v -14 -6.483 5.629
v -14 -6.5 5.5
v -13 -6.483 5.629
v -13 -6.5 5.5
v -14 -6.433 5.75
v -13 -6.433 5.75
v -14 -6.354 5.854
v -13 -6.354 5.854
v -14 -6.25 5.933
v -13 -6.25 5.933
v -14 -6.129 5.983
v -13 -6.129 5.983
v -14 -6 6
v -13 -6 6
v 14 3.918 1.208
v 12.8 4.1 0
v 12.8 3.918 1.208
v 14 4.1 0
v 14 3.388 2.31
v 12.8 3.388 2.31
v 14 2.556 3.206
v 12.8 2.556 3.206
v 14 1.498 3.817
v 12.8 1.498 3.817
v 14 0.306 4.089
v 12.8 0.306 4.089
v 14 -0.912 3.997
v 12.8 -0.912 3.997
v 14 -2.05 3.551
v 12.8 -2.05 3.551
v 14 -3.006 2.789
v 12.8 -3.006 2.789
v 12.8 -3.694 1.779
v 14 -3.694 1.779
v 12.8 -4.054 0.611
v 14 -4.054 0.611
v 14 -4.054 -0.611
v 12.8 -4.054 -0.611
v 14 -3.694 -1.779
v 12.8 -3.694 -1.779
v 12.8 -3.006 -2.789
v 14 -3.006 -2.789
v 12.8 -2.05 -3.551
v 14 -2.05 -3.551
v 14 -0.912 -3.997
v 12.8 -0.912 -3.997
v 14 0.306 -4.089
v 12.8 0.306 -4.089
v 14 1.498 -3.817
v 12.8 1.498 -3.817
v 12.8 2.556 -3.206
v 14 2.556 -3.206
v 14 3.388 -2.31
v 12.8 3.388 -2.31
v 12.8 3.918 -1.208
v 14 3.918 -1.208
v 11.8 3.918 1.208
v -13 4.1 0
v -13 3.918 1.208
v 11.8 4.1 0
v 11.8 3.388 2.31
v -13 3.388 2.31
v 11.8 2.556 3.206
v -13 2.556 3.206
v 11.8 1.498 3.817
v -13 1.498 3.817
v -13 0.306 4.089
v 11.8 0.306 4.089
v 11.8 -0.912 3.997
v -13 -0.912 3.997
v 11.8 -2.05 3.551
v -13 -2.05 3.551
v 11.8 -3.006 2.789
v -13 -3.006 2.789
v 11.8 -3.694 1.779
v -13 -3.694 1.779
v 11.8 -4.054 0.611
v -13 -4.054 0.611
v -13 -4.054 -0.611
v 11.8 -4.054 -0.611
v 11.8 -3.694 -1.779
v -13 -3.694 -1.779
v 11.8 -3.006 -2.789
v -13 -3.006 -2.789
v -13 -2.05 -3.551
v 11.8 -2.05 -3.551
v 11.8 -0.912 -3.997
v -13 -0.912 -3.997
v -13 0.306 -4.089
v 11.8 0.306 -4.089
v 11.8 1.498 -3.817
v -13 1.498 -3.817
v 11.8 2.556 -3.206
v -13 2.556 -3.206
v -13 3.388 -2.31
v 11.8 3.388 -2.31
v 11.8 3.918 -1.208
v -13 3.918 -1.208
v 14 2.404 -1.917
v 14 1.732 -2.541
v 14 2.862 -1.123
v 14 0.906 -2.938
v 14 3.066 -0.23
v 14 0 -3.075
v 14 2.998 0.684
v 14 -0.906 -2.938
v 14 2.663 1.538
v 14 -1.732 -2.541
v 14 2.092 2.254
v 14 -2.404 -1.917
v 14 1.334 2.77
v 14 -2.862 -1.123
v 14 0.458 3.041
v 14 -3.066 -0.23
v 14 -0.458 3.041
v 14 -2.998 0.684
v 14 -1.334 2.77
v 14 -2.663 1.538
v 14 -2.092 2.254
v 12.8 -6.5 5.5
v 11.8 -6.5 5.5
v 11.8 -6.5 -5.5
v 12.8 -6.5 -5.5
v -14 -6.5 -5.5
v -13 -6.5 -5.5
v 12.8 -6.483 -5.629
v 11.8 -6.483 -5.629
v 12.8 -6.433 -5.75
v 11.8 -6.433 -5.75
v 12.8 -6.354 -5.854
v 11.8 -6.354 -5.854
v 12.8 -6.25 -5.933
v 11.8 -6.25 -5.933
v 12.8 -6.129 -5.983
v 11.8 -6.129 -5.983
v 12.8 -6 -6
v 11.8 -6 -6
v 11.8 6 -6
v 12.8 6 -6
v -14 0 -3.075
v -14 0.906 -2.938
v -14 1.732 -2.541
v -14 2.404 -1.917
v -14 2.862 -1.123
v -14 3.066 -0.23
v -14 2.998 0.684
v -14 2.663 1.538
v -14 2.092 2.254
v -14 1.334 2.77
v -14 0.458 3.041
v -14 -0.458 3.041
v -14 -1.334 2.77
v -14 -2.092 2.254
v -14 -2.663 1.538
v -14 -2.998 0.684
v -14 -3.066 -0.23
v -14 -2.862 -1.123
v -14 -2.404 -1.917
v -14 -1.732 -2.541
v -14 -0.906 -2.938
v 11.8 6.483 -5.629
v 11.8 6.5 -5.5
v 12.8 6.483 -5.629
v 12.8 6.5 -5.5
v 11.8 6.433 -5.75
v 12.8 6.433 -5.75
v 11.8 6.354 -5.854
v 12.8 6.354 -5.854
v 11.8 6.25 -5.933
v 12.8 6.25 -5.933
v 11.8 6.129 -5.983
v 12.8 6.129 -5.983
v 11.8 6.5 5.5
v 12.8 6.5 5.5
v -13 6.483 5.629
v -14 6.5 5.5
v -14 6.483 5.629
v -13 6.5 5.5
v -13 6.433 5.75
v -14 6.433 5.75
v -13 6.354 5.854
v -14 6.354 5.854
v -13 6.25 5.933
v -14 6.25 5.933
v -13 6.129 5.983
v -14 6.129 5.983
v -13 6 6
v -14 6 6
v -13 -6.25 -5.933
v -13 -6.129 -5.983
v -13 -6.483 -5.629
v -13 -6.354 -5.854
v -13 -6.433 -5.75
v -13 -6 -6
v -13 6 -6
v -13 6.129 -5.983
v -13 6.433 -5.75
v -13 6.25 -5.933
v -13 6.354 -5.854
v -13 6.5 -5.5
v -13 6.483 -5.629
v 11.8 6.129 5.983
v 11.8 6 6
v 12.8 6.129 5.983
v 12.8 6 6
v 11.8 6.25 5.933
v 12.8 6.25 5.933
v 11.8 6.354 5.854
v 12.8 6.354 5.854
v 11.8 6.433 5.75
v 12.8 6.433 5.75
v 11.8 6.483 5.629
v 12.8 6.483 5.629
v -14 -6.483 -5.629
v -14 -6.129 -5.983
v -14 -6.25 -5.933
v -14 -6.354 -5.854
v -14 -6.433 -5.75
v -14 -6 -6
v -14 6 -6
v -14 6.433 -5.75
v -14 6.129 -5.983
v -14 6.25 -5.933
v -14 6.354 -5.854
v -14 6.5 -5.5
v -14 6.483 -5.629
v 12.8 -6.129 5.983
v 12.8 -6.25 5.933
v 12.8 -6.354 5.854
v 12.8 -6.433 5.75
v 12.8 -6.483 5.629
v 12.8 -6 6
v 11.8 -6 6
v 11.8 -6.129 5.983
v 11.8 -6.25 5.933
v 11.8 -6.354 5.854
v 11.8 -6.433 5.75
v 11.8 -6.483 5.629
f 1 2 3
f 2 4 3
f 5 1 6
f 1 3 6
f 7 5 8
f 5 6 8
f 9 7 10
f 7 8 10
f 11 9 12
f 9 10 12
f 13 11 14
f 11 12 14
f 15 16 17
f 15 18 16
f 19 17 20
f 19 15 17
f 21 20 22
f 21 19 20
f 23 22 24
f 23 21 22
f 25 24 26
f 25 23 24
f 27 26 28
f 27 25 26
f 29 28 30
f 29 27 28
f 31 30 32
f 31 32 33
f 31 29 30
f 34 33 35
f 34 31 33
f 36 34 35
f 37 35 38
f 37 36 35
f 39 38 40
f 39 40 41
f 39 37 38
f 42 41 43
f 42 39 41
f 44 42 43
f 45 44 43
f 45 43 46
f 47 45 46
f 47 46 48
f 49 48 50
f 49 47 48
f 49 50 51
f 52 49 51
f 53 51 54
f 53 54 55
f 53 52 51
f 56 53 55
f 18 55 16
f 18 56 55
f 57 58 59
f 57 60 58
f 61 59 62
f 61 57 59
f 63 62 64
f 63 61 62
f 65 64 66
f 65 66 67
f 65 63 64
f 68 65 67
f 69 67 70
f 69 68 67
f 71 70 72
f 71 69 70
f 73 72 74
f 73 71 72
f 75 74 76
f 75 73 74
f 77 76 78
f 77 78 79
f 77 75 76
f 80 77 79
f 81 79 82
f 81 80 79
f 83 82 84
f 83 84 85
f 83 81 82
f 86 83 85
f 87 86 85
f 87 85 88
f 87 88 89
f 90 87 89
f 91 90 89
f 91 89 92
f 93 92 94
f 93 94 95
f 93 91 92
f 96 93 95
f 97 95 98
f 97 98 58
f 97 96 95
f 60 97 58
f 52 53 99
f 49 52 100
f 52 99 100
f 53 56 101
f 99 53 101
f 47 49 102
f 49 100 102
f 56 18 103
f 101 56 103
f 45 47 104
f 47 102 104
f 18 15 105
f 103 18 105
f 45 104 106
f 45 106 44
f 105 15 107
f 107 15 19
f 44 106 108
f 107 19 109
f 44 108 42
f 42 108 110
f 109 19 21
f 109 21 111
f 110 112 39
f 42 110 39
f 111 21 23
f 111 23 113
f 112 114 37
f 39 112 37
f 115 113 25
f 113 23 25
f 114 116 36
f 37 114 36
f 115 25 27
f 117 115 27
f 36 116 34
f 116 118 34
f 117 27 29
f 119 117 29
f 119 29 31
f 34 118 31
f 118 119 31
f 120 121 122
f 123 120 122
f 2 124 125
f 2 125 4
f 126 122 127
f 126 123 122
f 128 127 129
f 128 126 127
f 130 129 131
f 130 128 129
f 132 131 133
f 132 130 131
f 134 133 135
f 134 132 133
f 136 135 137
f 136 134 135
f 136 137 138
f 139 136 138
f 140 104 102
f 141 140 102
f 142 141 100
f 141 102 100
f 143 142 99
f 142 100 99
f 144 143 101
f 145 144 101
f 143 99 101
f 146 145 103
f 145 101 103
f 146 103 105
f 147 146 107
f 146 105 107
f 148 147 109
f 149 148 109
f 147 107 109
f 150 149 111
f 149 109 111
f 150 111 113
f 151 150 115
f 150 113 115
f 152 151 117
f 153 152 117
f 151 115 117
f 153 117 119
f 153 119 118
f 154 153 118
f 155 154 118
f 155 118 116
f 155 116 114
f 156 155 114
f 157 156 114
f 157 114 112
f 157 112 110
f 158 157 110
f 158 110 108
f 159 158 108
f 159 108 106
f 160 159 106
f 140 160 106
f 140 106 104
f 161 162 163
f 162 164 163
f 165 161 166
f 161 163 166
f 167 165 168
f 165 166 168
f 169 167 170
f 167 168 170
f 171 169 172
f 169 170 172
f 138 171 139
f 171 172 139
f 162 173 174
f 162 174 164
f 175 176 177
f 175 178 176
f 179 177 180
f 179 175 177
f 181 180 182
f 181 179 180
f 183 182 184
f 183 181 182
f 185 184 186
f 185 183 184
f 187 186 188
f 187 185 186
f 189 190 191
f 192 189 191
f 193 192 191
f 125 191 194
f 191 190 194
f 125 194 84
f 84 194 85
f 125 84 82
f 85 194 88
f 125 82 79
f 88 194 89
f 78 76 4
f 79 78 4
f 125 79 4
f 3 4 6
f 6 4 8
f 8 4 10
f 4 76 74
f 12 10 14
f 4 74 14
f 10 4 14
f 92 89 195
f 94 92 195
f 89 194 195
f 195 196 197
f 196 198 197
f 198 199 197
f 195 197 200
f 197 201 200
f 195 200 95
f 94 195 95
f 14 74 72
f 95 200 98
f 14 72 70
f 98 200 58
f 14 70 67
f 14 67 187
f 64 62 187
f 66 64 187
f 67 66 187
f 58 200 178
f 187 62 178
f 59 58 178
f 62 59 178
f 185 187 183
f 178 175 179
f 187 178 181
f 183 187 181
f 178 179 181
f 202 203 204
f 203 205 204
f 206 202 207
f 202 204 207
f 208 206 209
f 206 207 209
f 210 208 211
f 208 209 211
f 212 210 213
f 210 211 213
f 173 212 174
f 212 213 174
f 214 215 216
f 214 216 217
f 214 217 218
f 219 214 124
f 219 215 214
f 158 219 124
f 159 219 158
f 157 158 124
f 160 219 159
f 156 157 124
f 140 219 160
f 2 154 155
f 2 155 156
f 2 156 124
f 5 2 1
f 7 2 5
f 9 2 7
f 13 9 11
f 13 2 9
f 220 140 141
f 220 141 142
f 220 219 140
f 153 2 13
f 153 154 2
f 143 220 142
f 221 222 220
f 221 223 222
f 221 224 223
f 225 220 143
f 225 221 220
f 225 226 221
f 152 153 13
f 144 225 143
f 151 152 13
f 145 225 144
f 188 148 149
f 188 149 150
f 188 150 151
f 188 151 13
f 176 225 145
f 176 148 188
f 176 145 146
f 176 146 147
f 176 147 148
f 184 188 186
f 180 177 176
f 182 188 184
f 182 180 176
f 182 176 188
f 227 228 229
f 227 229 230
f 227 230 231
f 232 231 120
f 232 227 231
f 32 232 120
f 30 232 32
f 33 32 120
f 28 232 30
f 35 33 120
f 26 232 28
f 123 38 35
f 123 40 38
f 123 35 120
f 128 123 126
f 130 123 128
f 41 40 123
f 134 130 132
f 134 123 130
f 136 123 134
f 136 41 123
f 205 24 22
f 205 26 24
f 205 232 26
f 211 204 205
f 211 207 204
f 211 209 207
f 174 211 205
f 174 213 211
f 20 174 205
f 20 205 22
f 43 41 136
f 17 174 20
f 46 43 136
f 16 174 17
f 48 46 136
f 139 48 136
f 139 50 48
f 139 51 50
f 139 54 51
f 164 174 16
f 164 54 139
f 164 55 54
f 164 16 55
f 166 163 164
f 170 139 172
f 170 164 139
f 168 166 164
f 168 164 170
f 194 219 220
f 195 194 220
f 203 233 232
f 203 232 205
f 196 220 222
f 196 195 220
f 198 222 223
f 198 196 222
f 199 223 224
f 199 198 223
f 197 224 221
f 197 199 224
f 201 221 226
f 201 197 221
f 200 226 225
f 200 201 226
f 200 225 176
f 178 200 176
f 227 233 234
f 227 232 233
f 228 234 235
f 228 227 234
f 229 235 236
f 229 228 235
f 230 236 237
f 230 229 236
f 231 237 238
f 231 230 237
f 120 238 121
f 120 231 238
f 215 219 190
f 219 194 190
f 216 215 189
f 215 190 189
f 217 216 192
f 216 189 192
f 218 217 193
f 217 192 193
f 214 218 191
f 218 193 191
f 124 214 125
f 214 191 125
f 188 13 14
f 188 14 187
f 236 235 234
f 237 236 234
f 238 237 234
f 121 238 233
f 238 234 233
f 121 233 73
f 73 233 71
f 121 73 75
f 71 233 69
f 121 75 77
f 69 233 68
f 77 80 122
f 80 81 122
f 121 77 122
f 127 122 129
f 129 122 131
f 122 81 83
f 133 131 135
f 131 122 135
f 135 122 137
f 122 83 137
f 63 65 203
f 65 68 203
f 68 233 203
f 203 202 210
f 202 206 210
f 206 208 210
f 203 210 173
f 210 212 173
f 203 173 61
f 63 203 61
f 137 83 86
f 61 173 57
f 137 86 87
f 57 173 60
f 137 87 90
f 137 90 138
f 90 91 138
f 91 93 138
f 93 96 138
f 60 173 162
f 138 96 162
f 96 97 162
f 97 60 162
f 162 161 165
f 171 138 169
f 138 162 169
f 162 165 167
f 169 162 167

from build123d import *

# Parameters (mm, degrees)
CROQUIS1_W              = 28
CROQUIS1_H              = 4.1
CROQUIS3_W              = 12
CROQUIS3_H              = 13
SALIENTE_EXTRUIR1_DEPTH = 1
CROQUIS4_W              = 12
CROQUIS4_H              = 13
SALIENTE_EXTRUIR2_DEPTH = 1
REDONDEO1_R             = 0.5
CORTAR_EXTRUIR1_REACH   = 30
CROQUIS5_R              = 3.075


with BuildPart() as part:
    # Croquis1 → Revolución1 (revolve)
    with BuildSketch(Plane.XY):
        with Locations((0, 2.05)):
            Rectangle(CROQUIS1_W, CROQUIS1_H)
    revolve(axis=Axis((-14, 0, 0), (1, 0, 0)))

    # Croquis3 → Saliente-Extruir1 (add)
    with BuildSketch(Plane(origin=(11.8, 0, 0), x_dir=(0, 0, -1), z_dir=(1, 0, 0))):
        Rectangle(CROQUIS3_W, CROQUIS3_H)
    extrude(amount=SALIENTE_EXTRUIR1_DEPTH)

    # Croquis4 → Saliente-Extruir2 (add)
    with BuildSketch(Plane.ZY.offset(14)):
        Rectangle(CROQUIS4_W, CROQUIS4_H)
    extrude(amount=-SALIENTE_EXTRUIR2_DEPTH)

    # Redondeo1
    redondeo1_edges = [part.edges().sort_by_distance(p)[0] for p in [
        (12.3, 6.5, 6),
        (12.3, -6.5, 6),
        (12.3, -6.5, -6),
        (12.3, 6.5, -6),
        (-13.5, -6.5, -6),
        (-13.5, 6.5, -6),
        (-13.5, 6.5, 6),
        (-13.5, -6.5, 6),
    ]]
    fillet(redondeo1_edges, radius=REDONDEO1_R)

    # Croquis5 → Cortar-Extruir1 (cut, up to next)
    with BuildSketch(Plane(origin=(14, 0, 0), x_dir=(0, 0, -1), z_dir=(1, 0, 0)), mode=Mode.PRIVATE) as cortar_extruir1_sk1:
        Circle(CROQUIS5_R)
    cortar_extruir1_tool1 = extrude(cortar_extruir1_sk1.sketch, amount=-CORTAR_EXTRUIR1_REACH, mode=Mode.PRIVATE) & part.part
    add(cortar_extruir1_tool1.solids().sort_by_distance((14, 0, 0))[0], mode=Mode.SUBTRACT)


solid = part.part
